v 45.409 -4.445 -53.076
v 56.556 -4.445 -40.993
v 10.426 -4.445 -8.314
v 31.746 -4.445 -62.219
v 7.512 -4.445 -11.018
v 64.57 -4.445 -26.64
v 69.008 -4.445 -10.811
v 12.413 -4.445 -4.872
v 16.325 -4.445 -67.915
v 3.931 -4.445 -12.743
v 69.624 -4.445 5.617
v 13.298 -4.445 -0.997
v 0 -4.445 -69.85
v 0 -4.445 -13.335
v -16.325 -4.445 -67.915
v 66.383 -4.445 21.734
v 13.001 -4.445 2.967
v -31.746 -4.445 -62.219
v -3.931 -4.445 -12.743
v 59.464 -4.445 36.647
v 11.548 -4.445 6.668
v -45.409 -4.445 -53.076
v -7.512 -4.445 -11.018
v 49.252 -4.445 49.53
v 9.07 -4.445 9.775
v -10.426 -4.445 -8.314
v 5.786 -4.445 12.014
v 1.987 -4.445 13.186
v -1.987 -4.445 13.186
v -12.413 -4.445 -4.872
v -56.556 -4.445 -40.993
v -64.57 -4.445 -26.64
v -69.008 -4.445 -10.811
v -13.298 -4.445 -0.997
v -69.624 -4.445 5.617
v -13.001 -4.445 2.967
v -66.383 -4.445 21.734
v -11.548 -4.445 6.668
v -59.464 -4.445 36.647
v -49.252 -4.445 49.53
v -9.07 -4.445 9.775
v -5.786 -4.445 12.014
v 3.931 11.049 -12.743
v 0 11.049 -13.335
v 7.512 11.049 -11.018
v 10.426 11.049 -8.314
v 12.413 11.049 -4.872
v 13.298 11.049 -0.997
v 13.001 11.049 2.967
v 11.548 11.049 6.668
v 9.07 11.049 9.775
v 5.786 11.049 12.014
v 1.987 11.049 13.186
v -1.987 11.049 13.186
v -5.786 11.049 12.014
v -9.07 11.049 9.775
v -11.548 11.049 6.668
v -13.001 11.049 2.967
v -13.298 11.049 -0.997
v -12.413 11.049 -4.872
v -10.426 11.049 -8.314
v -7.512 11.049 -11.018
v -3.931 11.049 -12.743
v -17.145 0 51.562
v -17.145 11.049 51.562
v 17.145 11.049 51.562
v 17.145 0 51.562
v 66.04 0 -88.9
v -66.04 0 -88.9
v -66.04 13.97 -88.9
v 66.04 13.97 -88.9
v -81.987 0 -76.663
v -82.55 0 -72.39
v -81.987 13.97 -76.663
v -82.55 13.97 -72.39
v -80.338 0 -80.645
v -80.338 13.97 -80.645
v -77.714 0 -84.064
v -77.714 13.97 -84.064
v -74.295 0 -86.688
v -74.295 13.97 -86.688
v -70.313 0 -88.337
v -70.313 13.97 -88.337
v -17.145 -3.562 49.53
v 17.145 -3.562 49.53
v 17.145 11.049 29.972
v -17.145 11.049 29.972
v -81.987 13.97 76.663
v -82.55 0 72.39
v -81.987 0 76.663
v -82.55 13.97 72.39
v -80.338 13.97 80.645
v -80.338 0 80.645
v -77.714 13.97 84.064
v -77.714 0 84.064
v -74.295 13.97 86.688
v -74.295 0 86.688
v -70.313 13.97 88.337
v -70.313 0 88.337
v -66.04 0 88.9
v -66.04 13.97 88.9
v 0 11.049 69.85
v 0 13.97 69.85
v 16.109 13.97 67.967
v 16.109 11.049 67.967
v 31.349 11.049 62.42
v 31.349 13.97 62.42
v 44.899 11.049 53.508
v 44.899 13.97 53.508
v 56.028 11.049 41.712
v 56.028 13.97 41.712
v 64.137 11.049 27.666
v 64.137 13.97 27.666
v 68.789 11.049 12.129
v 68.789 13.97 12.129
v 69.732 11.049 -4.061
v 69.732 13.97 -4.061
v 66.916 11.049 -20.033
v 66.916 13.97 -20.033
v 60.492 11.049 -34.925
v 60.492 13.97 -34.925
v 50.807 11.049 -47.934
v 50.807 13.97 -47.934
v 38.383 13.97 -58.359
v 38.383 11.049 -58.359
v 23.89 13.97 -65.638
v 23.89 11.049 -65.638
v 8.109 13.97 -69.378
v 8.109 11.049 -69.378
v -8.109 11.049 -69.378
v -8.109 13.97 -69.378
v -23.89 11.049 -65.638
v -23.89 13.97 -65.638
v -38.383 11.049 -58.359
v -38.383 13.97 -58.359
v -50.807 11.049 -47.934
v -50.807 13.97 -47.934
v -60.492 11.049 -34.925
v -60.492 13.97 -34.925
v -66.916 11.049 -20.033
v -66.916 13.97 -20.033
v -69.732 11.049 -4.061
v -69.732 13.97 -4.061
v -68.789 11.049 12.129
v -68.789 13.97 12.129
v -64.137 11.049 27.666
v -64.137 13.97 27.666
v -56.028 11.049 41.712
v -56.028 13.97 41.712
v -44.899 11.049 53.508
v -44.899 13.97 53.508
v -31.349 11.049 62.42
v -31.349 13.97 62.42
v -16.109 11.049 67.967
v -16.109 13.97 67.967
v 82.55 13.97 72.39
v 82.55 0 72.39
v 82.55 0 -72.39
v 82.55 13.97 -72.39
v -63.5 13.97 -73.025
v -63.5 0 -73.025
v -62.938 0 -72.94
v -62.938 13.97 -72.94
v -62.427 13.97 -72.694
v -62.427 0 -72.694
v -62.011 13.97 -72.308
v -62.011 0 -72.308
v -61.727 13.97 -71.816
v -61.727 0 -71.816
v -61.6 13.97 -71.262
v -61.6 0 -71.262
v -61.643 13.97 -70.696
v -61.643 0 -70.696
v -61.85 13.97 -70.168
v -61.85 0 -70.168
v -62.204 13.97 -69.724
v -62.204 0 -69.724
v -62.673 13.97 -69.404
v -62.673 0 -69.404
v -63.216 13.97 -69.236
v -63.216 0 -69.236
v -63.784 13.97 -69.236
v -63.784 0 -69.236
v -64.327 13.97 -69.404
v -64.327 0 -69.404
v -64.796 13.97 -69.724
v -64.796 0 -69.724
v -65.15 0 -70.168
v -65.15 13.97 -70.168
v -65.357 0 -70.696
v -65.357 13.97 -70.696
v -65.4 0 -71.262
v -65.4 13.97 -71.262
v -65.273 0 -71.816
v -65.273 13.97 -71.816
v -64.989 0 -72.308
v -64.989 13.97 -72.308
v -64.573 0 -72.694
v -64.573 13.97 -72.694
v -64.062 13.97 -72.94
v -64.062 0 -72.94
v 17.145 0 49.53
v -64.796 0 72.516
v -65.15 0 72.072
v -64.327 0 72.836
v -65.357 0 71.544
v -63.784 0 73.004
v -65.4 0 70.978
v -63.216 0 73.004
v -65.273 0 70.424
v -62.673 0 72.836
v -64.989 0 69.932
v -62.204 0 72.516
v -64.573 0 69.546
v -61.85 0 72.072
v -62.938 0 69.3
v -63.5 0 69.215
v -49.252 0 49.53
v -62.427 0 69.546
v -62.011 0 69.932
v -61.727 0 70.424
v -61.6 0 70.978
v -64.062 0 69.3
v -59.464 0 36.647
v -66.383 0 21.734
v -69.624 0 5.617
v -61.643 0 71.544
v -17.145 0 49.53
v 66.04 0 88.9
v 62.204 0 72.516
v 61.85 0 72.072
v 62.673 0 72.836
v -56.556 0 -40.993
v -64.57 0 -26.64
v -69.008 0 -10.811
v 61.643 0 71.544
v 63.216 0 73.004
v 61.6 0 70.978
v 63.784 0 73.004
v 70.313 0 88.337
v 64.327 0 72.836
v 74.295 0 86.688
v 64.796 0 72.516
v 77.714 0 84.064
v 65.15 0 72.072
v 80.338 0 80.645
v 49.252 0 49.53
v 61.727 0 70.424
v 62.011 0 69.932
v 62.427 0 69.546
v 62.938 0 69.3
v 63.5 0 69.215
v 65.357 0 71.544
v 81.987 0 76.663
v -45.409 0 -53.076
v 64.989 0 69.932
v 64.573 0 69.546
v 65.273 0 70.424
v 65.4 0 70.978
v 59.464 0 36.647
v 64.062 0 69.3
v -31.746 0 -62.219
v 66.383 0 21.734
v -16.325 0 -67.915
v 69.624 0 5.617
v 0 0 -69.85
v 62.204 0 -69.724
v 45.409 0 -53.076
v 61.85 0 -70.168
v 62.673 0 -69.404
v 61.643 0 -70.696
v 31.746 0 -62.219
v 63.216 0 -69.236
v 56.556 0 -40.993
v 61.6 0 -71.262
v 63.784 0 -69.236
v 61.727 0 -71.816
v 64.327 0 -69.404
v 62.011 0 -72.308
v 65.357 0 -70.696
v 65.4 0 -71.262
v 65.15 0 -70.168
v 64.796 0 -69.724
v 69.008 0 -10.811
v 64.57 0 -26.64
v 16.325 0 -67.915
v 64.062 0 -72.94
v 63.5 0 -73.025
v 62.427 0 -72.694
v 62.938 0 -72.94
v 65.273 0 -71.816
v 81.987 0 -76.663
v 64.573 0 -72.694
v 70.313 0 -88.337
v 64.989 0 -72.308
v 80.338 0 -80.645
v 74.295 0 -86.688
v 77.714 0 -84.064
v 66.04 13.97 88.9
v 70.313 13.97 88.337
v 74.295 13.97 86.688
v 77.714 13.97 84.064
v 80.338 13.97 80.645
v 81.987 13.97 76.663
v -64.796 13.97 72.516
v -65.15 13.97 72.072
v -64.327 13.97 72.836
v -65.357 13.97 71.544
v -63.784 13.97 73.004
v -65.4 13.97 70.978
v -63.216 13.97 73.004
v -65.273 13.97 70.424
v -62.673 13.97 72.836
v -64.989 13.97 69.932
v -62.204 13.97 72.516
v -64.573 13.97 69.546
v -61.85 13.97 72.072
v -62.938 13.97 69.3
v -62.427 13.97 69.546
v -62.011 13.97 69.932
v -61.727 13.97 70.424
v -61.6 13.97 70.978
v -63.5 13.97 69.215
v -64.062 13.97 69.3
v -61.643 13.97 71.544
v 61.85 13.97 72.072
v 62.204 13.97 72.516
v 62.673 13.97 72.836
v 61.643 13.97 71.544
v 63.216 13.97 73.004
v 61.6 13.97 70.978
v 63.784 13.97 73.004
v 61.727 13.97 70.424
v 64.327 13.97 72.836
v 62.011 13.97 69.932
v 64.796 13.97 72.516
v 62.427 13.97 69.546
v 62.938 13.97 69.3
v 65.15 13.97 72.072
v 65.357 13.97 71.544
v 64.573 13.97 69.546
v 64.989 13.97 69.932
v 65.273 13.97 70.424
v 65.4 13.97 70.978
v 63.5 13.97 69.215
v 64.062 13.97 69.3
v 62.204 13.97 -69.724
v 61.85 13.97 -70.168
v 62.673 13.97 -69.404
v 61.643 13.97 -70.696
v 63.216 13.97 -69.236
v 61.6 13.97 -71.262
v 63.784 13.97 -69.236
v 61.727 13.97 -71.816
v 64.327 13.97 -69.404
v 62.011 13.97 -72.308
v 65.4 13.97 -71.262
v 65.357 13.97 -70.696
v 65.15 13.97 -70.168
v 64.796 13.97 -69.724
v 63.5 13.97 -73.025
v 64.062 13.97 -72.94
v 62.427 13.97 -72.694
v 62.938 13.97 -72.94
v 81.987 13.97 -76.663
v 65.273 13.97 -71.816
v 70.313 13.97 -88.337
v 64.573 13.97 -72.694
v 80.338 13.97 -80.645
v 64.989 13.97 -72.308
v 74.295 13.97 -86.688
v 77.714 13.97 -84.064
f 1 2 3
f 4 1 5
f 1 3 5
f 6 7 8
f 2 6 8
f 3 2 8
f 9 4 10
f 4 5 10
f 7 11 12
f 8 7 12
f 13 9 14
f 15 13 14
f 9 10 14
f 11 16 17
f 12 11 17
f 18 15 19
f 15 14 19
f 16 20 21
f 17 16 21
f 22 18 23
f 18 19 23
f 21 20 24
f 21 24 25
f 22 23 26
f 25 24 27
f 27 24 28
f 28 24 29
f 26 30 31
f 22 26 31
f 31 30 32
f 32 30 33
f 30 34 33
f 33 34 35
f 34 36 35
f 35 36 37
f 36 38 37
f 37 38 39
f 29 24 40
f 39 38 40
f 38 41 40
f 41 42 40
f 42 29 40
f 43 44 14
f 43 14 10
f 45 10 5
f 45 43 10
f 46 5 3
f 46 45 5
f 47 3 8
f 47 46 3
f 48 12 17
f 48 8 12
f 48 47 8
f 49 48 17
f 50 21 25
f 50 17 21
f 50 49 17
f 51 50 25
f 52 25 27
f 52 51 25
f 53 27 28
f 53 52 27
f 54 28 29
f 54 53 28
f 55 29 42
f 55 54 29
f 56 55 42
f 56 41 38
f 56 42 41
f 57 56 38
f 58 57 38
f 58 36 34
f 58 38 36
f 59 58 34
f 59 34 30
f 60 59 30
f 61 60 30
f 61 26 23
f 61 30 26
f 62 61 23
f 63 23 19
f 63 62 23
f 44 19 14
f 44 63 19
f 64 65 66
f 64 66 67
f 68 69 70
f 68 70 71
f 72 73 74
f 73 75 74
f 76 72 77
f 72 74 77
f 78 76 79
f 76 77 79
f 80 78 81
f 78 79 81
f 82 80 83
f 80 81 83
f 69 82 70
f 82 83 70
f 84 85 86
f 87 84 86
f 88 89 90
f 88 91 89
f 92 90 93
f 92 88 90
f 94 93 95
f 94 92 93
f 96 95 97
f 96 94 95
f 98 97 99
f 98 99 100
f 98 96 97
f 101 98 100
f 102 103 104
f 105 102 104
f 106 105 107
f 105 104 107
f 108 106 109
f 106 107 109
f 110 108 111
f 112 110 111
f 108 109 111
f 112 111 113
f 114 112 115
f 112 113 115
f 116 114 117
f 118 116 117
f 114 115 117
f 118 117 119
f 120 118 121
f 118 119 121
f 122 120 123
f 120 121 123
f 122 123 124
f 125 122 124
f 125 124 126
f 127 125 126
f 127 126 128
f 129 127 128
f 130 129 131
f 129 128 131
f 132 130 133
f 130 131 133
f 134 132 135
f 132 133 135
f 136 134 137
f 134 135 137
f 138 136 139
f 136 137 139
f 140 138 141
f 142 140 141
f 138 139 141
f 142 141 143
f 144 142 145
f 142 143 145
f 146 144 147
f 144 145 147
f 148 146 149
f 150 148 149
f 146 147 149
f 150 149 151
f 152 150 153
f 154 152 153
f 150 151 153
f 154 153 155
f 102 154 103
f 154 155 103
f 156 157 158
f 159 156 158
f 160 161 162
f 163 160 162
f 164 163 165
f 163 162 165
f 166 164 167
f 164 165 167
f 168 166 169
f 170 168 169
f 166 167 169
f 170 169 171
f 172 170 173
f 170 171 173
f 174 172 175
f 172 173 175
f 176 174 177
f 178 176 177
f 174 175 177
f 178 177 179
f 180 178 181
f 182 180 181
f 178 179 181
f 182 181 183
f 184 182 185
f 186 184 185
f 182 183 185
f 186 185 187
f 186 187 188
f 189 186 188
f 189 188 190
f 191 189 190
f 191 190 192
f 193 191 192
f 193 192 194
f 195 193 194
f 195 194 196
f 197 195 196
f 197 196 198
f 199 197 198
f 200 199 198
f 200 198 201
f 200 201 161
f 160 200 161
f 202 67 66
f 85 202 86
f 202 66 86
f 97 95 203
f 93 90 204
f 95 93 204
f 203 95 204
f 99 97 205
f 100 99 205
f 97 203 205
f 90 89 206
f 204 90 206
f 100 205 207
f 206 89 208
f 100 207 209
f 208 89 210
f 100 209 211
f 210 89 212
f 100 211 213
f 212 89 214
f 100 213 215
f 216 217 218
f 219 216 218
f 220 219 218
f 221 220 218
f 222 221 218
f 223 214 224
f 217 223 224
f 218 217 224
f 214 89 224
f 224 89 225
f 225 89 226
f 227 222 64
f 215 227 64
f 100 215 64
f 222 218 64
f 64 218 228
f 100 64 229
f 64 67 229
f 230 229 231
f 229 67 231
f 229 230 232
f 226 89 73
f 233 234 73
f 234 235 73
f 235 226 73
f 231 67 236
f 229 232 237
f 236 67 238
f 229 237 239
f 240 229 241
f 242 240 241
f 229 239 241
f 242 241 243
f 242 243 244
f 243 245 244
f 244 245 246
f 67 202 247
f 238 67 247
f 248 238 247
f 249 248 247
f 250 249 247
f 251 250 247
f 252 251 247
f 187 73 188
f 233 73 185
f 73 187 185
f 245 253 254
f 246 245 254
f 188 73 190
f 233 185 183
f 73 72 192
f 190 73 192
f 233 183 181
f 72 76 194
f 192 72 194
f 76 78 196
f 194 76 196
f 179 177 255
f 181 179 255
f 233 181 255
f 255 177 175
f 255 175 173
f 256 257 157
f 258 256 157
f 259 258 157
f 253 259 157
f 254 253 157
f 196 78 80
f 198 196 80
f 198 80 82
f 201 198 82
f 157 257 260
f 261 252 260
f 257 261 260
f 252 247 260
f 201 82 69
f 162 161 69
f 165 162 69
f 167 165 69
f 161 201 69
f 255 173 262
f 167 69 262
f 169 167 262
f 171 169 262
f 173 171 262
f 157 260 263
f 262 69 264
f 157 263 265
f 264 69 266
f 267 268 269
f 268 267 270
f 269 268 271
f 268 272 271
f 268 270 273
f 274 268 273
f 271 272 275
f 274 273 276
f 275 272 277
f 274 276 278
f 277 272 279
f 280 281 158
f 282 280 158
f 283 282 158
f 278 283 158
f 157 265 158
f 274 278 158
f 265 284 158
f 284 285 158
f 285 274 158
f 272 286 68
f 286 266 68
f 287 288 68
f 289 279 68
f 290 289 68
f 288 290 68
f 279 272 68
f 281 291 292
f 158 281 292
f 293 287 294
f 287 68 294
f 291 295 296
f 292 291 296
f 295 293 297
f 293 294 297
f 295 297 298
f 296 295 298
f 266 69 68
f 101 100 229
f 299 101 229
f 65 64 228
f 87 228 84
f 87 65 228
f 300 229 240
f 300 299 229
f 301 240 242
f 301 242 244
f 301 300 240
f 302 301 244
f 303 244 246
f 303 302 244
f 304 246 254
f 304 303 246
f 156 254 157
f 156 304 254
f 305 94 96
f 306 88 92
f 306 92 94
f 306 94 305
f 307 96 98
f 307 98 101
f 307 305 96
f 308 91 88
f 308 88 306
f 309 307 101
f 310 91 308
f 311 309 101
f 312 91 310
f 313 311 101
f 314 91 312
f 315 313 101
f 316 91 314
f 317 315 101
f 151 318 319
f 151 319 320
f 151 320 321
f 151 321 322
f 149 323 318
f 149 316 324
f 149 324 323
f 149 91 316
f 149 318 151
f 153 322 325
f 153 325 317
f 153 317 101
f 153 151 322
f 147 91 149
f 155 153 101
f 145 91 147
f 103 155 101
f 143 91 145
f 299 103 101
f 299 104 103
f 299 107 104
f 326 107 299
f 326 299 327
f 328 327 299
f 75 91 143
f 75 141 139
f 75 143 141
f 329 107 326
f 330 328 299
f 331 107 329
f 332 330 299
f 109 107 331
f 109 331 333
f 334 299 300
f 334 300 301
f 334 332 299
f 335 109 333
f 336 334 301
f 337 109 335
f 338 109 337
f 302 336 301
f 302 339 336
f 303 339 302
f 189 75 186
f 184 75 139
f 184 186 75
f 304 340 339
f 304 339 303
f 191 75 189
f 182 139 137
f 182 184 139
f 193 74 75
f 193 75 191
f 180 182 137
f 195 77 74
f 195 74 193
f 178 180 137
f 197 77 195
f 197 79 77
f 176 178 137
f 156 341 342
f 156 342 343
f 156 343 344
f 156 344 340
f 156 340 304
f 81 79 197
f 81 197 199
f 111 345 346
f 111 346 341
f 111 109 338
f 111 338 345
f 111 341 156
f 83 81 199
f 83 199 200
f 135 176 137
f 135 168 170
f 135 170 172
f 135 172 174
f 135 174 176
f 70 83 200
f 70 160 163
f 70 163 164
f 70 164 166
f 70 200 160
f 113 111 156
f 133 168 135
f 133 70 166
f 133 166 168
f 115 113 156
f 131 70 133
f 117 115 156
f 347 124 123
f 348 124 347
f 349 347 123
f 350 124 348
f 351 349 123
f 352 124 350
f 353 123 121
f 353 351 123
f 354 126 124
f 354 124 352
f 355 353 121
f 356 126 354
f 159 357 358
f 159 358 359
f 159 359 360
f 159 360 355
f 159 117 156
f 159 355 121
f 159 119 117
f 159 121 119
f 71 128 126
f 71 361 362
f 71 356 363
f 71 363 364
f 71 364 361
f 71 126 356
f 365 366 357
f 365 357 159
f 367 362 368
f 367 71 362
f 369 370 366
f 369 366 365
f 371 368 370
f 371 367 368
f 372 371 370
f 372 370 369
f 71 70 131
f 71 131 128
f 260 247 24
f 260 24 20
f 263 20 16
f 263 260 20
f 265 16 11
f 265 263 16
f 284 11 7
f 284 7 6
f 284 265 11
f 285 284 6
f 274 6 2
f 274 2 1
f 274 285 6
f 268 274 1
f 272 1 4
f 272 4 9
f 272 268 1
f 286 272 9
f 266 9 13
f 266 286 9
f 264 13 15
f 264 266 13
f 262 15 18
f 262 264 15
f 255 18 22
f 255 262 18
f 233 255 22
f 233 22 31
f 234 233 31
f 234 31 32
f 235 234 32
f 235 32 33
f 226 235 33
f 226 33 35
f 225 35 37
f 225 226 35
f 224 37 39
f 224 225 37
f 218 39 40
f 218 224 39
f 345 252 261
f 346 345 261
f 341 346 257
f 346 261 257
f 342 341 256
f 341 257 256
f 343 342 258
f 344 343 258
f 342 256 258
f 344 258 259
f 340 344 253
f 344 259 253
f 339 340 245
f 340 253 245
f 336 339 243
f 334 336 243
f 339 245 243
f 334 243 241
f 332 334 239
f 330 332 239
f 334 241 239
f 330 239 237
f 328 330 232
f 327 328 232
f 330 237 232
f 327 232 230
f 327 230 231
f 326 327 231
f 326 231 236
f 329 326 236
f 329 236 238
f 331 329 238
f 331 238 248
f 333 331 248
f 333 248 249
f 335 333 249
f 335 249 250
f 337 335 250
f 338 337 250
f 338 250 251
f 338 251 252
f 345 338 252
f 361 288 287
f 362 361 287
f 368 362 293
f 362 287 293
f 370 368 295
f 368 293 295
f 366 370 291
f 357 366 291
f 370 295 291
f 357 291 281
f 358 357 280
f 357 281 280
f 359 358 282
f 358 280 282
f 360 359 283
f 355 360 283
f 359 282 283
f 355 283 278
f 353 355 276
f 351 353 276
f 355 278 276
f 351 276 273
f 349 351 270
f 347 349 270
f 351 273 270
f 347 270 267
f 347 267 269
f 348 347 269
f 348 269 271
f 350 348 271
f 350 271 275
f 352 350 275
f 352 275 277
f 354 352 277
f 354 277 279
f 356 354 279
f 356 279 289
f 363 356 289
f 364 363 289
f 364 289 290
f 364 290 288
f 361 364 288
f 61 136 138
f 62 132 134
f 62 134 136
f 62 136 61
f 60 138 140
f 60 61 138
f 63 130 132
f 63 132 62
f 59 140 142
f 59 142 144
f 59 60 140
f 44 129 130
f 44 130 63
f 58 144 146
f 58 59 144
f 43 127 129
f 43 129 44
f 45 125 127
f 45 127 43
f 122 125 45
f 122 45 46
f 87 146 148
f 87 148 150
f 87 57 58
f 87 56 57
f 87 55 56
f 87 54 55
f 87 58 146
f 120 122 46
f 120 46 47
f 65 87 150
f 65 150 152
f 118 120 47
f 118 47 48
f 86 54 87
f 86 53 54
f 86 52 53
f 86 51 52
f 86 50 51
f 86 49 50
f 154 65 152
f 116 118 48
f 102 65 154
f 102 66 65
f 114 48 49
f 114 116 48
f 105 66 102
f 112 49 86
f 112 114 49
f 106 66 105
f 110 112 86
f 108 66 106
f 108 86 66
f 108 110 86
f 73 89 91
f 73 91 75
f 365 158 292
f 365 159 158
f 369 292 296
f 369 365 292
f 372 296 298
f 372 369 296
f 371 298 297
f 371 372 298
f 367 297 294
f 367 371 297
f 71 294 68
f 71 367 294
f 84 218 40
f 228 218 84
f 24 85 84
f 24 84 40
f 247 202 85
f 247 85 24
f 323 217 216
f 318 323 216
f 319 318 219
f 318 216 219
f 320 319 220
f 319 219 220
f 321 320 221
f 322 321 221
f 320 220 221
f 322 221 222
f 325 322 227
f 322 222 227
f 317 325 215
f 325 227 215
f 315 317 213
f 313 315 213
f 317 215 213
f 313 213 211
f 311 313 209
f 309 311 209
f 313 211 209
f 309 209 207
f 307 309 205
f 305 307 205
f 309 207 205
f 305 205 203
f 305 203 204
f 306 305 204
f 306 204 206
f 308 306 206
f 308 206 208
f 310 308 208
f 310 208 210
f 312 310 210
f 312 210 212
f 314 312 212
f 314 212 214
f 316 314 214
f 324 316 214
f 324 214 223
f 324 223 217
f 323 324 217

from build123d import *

# Parameters (mm, degrees)
SKETCH2_W               = 165.1
SKETCH2_H               = 177.8
BOSS_EXTRUDE1_DEPTH     = 13.97
FILLET1_R               = 16.51
SKETCH3_R               = 1.905
CUT_EXTRUDE1_DEPTH      = 123.118276273
BOSS_EXTRUDE2_DEPTH     = 4.445
CUT_EXTRUDE3_DEPTH      = 123.118276273
CUT_EXTRUDE3_DEPTH_BACK = 123.118276273
SKETCH4_R               = 13.335
SKETCH9_R               = 69.85
CUT_EXTRUDE4_DEPTH      = 2.921
CUT_EXTRUDE5_DEPTH      = 17.145


with BuildPart() as part:
    # Sketch2 → Boss-Extrude1 (new body)
    with BuildSketch(Plane(origin=(0, 0, 0), x_dir=(1, 0, 0), z_dir=(0, 1, 0))):
        Rectangle(SKETCH2_W, SKETCH2_H)
    extrude(amount=BOSS_EXTRUDE1_DEPTH)

    # Fillet1
    fillet1_edges = [part.edges().sort_by_distance(p)[0] for p in [
        (82.55, 6.985, 88.9),
        (-82.55, 6.985, 88.9),
        (-82.55, 6.985, -88.9),
        (82.55, 6.985, -88.9),
    ]]
    fillet(fillet1_edges, radius=FILLET1_R)

    # Sketch3 → Cut-Extrude1 (cut, through all)
    with BuildSketch(Plane.XZ):
        with Locations(Location((-63.5, 71.12, 0), (0, 0, 270))):
            Circle(SKETCH3_R)
        with Locations(Location((63.5, 71.12, 0), (0, 0, 270))):
            Circle(SKETCH3_R)
        with Locations(Location((-63.5, -71.12, 0), (0, 0, 270))):
            Circle(SKETCH3_R)
        with Locations(Location((63.5, -71.12, 0), (0, 0, 270))):
            Circle(SKETCH3_R)
    extrude(amount=-CUT_EXTRUDE1_DEPTH, mode=Mode.SUBTRACT)

    # Sketch5 → Boss-Extrude2 (add)
    with BuildSketch(Plane.XZ):
        with BuildLine():
            Line((-49.252427351, 49.53), (49.252427351, 49.53))
            ThreePointArc((49.252427351, 49.53), (0, -69.85), (-49.252427351, 49.53))
        make_face()
    extrude(amount=BOSS_EXTRUDE2_DEPTH)

    # Sketch4 → Cut-Extrude3 (cut, two sides: drawn at the far end of the back side and taken through both)
    with BuildSketch(Plane.XZ.offset(-CUT_EXTRUDE3_DEPTH_BACK)):
        with Locations(Location((0, 0, 0), (0, 0, 270))):
            Circle(SKETCH4_R)
    extrude(amount=CUT_EXTRUDE3_DEPTH + CUT_EXTRUDE3_DEPTH_BACK, mode=Mode.SUBTRACT)

    # Sketch9 → Cut-Extrude4 (cut)
    with BuildSketch(Plane(origin=(0, 13.97, 0), x_dir=(1, 0, 0), z_dir=(0, 1, 0))):
        with Locations(Location((0, 0, 0), (0, 0, 270))):
            Circle(SKETCH9_R)
    extrude(amount=-CUT_EXTRUDE4_DEPTH, mode=Mode.SUBTRACT)

    # Sketch15 → Cut-Extrude5 (cut, symmetric)
    with BuildSketch(Plane(origin=(0, 0, 0), x_dir=(0, 0, -1), z_dir=(1, 0, 0))):
        Polygon((-51.562, 11.049), (-51.562, -5.08), (-29.972, 11.049), align=None)
    extrude(amount=CUT_EXTRUDE5_DEPTH, both=True, mode=Mode.SUBTRACT)


solid = part.part
